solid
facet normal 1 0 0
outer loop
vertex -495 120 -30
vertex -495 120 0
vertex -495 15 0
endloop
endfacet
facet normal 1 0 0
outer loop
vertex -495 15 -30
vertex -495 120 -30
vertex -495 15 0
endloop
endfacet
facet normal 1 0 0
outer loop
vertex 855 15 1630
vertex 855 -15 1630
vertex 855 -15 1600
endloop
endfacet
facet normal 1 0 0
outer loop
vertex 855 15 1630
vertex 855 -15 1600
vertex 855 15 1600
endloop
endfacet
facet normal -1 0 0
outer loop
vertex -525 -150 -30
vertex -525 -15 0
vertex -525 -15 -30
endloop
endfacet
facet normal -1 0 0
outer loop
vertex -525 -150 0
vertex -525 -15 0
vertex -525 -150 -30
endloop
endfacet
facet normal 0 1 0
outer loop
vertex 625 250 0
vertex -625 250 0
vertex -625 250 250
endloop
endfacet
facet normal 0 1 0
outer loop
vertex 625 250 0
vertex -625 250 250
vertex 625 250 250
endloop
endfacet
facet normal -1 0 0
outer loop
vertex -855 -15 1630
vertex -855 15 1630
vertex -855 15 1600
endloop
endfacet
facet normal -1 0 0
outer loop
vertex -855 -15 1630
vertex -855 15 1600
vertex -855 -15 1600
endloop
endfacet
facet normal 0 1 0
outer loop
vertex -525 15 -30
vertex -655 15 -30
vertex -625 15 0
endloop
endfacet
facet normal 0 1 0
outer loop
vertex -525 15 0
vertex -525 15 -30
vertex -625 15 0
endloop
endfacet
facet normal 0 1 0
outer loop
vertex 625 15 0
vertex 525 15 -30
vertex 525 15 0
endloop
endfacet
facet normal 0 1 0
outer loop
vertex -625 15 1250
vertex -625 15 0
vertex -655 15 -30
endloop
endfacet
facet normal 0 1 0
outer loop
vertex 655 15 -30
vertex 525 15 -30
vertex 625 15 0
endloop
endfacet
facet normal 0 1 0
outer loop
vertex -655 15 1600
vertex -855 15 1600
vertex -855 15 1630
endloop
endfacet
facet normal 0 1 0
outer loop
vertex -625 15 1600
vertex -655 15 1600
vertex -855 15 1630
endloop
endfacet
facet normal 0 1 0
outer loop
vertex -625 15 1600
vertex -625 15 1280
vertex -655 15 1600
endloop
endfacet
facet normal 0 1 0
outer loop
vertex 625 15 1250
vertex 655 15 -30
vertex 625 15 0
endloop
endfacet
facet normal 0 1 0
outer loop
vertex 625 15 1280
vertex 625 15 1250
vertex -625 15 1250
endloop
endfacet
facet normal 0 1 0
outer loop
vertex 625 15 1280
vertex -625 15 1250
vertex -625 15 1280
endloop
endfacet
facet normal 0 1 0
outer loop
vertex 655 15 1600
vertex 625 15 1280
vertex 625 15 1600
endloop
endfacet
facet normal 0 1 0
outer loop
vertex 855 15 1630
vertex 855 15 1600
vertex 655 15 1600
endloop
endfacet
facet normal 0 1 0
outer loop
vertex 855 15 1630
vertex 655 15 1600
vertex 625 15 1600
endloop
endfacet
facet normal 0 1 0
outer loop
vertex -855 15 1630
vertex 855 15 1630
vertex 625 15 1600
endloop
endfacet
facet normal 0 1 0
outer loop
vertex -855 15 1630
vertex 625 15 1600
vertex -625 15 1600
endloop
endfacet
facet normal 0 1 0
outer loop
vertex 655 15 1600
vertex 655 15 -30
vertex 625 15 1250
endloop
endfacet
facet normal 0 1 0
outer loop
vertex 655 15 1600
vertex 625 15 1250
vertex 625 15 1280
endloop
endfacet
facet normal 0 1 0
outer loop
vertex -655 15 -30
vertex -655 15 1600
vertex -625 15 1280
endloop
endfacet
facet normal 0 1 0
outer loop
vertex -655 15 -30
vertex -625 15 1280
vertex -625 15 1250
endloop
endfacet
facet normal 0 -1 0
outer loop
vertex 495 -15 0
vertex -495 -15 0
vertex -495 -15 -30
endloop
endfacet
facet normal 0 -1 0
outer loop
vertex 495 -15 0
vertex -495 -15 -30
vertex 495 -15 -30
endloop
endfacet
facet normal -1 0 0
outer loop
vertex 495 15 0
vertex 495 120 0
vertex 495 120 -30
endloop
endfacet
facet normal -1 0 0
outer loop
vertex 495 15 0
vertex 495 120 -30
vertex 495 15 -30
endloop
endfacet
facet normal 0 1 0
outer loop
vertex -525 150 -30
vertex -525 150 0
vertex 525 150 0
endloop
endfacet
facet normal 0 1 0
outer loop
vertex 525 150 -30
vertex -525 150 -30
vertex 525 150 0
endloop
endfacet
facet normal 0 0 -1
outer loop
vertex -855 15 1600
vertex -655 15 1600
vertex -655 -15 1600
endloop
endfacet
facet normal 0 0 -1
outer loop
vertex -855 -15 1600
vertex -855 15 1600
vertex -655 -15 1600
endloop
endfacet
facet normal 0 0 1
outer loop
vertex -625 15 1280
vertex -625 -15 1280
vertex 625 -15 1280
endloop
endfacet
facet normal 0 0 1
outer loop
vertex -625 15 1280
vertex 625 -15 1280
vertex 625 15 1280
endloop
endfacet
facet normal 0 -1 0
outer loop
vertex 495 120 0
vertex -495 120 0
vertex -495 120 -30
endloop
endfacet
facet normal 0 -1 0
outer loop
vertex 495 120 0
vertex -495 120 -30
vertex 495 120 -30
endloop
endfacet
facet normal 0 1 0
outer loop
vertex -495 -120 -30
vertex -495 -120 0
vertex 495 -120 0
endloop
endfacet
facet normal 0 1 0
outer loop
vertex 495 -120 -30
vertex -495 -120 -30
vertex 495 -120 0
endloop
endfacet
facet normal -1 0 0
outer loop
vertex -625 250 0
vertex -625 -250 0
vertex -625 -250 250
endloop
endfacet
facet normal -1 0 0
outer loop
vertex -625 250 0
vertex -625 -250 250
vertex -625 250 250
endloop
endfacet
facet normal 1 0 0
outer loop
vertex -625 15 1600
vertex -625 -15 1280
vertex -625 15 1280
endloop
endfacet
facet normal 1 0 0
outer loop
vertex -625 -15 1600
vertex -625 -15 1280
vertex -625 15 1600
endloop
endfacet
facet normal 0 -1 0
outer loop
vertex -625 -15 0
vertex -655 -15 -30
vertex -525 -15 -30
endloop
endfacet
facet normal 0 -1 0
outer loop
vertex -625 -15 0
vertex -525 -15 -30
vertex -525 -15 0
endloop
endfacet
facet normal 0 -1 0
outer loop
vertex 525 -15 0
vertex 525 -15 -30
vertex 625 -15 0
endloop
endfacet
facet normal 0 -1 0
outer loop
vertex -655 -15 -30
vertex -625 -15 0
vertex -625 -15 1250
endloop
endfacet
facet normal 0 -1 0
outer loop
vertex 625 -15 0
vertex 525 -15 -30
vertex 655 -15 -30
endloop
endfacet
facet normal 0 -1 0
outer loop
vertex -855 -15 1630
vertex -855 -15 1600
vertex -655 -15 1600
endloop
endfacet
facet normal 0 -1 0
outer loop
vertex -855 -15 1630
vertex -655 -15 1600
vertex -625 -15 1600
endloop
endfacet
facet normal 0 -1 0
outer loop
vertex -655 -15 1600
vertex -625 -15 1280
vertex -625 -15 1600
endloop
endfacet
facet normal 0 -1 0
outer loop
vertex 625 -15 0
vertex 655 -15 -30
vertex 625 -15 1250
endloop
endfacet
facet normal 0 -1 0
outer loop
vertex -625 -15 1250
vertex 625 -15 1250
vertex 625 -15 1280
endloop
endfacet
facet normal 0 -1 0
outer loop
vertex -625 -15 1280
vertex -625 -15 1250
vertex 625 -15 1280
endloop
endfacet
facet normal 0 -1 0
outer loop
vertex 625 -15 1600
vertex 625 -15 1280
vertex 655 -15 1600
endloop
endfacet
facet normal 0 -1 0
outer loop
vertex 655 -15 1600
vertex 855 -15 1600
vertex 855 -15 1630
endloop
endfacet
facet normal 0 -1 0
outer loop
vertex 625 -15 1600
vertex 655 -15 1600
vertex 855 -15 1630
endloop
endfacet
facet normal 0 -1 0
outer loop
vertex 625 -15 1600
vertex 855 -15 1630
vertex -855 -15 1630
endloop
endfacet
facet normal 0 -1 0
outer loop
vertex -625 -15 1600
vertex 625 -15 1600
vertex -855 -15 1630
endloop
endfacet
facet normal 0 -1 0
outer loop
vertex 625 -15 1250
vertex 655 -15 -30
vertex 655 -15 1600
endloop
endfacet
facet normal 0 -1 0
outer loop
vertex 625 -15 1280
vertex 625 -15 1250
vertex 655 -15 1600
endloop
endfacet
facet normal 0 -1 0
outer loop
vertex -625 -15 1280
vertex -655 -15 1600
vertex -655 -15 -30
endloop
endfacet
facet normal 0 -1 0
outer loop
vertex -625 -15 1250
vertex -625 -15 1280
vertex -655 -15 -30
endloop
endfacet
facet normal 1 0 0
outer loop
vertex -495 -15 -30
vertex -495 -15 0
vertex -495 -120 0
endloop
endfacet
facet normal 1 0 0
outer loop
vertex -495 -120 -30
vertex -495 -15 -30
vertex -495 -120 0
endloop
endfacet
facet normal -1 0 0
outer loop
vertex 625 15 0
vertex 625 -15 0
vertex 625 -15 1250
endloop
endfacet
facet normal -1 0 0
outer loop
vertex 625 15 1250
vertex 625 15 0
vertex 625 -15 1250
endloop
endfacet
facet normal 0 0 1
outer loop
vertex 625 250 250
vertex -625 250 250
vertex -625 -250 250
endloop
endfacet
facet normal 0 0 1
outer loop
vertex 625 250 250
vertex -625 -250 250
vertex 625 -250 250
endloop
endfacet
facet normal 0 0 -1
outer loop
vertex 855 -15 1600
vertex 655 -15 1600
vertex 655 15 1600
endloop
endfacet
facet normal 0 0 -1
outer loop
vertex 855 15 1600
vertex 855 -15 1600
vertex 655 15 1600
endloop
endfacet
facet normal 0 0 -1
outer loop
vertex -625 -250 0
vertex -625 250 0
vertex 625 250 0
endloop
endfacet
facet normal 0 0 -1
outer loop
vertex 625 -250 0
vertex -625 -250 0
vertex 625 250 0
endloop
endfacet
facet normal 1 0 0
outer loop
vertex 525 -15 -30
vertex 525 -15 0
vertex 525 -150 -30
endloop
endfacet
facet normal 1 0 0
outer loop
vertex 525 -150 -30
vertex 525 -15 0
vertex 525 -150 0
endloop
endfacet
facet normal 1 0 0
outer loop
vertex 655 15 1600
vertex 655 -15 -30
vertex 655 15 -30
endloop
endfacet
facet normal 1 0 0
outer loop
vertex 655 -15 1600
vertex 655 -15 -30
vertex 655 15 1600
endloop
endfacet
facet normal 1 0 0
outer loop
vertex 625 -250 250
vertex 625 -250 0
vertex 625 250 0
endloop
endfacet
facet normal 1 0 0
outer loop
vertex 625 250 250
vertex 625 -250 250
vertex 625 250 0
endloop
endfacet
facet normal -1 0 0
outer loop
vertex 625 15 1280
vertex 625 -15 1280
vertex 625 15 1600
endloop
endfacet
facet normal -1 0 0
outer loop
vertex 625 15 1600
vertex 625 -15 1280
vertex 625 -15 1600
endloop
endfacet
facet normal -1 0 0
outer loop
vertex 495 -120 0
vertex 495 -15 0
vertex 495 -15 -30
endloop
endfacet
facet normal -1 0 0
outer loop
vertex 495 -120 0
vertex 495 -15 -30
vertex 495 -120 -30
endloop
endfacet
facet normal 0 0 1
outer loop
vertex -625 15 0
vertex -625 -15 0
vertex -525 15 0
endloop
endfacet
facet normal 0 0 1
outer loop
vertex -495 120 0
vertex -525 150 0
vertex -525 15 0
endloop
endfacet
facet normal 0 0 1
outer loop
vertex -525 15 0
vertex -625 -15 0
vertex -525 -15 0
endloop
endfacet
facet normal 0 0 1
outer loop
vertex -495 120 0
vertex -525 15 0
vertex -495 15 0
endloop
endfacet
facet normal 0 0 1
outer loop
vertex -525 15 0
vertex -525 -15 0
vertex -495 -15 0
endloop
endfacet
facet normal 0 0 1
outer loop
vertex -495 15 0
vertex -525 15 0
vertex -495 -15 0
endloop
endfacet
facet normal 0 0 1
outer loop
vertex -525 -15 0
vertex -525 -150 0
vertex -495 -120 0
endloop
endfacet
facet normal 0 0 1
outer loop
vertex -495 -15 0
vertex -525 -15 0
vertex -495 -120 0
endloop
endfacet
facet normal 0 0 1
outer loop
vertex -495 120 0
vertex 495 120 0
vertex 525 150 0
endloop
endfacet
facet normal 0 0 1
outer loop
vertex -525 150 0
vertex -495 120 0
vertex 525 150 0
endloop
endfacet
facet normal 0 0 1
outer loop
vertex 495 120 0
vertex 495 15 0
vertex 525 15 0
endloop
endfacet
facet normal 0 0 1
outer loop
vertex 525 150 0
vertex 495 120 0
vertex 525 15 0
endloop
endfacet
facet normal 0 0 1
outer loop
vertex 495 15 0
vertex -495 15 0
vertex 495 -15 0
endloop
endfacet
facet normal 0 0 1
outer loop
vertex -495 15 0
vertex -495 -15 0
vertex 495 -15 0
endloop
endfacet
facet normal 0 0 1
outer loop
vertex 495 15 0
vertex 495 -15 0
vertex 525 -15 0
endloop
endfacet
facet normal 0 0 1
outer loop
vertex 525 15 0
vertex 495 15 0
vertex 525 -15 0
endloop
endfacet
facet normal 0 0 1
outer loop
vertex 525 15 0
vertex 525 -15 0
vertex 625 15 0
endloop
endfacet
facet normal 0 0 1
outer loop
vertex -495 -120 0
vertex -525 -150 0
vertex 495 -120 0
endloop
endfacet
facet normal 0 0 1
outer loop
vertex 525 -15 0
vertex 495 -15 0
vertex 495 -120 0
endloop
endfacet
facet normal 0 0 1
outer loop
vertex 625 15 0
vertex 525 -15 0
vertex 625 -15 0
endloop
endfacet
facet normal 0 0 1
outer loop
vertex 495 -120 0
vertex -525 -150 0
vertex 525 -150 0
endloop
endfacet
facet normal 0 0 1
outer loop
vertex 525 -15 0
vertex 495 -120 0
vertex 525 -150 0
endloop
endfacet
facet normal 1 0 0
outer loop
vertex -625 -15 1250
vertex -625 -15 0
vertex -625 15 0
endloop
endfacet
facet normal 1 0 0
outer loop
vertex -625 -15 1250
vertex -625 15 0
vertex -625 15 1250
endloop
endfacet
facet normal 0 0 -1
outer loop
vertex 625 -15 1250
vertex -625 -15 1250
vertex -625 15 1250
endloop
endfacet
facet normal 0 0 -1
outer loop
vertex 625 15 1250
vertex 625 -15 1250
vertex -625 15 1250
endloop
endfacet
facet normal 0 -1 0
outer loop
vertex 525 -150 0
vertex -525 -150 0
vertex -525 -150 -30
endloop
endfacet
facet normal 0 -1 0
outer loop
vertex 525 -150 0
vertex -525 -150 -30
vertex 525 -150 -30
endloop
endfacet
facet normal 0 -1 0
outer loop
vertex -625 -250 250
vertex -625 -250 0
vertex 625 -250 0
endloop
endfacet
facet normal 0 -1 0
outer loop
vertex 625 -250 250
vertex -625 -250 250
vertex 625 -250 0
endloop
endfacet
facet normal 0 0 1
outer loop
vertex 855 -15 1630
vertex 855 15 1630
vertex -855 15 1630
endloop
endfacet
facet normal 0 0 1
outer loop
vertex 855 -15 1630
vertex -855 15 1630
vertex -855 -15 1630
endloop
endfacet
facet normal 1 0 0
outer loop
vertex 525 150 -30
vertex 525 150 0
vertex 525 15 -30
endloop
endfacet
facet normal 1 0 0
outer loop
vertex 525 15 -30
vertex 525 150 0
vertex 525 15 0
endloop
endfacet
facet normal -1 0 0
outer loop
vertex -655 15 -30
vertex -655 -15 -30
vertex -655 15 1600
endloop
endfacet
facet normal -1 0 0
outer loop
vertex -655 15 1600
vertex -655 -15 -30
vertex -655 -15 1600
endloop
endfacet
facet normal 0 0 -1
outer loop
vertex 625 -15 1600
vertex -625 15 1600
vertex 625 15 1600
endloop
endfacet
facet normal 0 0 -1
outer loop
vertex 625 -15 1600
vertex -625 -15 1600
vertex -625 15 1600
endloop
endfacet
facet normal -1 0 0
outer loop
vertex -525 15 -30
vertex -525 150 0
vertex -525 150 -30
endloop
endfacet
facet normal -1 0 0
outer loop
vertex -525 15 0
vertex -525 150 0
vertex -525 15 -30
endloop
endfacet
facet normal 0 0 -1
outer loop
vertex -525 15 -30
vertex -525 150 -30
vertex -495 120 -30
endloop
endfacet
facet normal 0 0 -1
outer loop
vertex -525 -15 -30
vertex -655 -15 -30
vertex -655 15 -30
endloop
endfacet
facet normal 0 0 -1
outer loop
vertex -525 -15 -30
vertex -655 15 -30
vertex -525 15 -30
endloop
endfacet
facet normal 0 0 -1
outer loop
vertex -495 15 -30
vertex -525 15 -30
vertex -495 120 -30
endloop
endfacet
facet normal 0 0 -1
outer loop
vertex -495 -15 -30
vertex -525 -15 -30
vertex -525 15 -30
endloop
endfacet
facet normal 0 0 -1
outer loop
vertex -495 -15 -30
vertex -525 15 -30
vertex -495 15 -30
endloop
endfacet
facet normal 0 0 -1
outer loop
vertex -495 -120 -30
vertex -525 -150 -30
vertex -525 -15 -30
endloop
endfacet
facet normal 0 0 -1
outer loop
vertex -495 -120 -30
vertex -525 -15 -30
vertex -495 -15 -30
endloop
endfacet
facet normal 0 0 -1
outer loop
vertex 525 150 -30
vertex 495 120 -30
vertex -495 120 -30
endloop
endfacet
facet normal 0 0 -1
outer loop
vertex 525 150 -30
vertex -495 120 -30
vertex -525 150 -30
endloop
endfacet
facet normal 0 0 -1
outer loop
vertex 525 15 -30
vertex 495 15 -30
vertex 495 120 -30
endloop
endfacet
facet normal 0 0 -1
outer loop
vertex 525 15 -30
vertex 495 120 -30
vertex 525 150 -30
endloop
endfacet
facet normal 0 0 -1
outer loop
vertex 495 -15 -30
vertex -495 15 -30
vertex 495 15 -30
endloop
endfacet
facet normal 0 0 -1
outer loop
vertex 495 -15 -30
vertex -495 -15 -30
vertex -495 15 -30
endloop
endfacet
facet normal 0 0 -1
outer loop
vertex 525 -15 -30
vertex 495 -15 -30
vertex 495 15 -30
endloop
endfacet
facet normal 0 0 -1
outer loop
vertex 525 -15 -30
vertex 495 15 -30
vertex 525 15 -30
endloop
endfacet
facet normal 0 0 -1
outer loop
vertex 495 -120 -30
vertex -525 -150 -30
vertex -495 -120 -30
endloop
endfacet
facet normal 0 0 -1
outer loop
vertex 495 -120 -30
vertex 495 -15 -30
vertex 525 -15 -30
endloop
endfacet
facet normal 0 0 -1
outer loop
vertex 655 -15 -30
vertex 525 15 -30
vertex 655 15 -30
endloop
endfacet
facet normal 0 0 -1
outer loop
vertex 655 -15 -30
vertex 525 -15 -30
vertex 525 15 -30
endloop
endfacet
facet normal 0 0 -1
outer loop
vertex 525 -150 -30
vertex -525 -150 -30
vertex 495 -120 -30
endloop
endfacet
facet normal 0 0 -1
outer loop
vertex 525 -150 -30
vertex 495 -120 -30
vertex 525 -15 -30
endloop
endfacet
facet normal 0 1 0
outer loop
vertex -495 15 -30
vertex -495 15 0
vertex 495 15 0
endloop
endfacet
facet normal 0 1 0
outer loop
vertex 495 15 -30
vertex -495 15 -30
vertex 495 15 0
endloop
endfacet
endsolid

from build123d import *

# Parameters (mm, degrees)
F0_W      = 1250
F0_H      = 500
F1_DEPTH  = 250
F2_W      = 1310
F2_H      = 1660
F2_W_2    = 1250
F2_H_2    = 1600
F3_DEPTH  = 15
F4_W      = 1050
F4_H      = 300
F4_W_2    = 990
F4_H_2    = 240
F5_DEPTH  = 30
F6_W      = 30
F6_H      = 30
F7_DEPTH  = 200
F8_W      = 30
F8_H      = 30
F9_DEPTH  = 200
F10_W     = 30
F10_H     = 30
F11_DEPTH = 1250


with BuildPart() as f1:
    # F0 (on Top) → F1 (new body)
    with BuildSketch(Plane.XY):
        Rectangle(F0_W, F0_H)
    extrude(amount=F1_DEPTH)


with BuildPart() as f3:
    # F2 (on Front) → F3 (new body, symmetric)
    with BuildSketch(Plane.XZ):
        with Locations((0, 800)):
            Rectangle(F2_W, F2_H)
        with Locations((0, 800)):
            Rectangle(F2_W_2, F2_H_2, mode=Mode.SUBTRACT)
    extrude(amount=F3_DEPTH, both=True)

    # F4 (on face) → F5 (join)
    with BuildSketch(Plane(origin=(0, 0, 0), x_dir=(1, 0, 0), z_dir=(0, 0, -1))):
        Rectangle(F4_W, F4_H)
        Rectangle(F4_W_2, F4_H_2, mode=Mode.SUBTRACT)
    extrude(amount=F5_DEPTH)

    # F6 (on face) → F7 (join)
    with BuildSketch(Plane.YZ.offset(655)):
        with Locations((0, 1615)):
            Rectangle(F6_W, F6_H)
    extrude(amount=F7_DEPTH)

    # F8 (on face) → F9 (join)
    with BuildSketch(Plane(origin=(-655, 0, 0), x_dir=(0, -1, 0), z_dir=(-1, 0, 0))):
        with Locations((0, 1615)):
            Rectangle(F8_W, F8_H)
    extrude(amount=F9_DEPTH)

    # F10 (on face) → F11 (join, through all)
    with BuildSketch(Plane.YZ.offset(-625)):
        with Locations((0, 1265)):
            Rectangle(F10_W, F10_H)
    extrude(amount=F11_DEPTH)


solid = Compound([f1.part, f3.part])
